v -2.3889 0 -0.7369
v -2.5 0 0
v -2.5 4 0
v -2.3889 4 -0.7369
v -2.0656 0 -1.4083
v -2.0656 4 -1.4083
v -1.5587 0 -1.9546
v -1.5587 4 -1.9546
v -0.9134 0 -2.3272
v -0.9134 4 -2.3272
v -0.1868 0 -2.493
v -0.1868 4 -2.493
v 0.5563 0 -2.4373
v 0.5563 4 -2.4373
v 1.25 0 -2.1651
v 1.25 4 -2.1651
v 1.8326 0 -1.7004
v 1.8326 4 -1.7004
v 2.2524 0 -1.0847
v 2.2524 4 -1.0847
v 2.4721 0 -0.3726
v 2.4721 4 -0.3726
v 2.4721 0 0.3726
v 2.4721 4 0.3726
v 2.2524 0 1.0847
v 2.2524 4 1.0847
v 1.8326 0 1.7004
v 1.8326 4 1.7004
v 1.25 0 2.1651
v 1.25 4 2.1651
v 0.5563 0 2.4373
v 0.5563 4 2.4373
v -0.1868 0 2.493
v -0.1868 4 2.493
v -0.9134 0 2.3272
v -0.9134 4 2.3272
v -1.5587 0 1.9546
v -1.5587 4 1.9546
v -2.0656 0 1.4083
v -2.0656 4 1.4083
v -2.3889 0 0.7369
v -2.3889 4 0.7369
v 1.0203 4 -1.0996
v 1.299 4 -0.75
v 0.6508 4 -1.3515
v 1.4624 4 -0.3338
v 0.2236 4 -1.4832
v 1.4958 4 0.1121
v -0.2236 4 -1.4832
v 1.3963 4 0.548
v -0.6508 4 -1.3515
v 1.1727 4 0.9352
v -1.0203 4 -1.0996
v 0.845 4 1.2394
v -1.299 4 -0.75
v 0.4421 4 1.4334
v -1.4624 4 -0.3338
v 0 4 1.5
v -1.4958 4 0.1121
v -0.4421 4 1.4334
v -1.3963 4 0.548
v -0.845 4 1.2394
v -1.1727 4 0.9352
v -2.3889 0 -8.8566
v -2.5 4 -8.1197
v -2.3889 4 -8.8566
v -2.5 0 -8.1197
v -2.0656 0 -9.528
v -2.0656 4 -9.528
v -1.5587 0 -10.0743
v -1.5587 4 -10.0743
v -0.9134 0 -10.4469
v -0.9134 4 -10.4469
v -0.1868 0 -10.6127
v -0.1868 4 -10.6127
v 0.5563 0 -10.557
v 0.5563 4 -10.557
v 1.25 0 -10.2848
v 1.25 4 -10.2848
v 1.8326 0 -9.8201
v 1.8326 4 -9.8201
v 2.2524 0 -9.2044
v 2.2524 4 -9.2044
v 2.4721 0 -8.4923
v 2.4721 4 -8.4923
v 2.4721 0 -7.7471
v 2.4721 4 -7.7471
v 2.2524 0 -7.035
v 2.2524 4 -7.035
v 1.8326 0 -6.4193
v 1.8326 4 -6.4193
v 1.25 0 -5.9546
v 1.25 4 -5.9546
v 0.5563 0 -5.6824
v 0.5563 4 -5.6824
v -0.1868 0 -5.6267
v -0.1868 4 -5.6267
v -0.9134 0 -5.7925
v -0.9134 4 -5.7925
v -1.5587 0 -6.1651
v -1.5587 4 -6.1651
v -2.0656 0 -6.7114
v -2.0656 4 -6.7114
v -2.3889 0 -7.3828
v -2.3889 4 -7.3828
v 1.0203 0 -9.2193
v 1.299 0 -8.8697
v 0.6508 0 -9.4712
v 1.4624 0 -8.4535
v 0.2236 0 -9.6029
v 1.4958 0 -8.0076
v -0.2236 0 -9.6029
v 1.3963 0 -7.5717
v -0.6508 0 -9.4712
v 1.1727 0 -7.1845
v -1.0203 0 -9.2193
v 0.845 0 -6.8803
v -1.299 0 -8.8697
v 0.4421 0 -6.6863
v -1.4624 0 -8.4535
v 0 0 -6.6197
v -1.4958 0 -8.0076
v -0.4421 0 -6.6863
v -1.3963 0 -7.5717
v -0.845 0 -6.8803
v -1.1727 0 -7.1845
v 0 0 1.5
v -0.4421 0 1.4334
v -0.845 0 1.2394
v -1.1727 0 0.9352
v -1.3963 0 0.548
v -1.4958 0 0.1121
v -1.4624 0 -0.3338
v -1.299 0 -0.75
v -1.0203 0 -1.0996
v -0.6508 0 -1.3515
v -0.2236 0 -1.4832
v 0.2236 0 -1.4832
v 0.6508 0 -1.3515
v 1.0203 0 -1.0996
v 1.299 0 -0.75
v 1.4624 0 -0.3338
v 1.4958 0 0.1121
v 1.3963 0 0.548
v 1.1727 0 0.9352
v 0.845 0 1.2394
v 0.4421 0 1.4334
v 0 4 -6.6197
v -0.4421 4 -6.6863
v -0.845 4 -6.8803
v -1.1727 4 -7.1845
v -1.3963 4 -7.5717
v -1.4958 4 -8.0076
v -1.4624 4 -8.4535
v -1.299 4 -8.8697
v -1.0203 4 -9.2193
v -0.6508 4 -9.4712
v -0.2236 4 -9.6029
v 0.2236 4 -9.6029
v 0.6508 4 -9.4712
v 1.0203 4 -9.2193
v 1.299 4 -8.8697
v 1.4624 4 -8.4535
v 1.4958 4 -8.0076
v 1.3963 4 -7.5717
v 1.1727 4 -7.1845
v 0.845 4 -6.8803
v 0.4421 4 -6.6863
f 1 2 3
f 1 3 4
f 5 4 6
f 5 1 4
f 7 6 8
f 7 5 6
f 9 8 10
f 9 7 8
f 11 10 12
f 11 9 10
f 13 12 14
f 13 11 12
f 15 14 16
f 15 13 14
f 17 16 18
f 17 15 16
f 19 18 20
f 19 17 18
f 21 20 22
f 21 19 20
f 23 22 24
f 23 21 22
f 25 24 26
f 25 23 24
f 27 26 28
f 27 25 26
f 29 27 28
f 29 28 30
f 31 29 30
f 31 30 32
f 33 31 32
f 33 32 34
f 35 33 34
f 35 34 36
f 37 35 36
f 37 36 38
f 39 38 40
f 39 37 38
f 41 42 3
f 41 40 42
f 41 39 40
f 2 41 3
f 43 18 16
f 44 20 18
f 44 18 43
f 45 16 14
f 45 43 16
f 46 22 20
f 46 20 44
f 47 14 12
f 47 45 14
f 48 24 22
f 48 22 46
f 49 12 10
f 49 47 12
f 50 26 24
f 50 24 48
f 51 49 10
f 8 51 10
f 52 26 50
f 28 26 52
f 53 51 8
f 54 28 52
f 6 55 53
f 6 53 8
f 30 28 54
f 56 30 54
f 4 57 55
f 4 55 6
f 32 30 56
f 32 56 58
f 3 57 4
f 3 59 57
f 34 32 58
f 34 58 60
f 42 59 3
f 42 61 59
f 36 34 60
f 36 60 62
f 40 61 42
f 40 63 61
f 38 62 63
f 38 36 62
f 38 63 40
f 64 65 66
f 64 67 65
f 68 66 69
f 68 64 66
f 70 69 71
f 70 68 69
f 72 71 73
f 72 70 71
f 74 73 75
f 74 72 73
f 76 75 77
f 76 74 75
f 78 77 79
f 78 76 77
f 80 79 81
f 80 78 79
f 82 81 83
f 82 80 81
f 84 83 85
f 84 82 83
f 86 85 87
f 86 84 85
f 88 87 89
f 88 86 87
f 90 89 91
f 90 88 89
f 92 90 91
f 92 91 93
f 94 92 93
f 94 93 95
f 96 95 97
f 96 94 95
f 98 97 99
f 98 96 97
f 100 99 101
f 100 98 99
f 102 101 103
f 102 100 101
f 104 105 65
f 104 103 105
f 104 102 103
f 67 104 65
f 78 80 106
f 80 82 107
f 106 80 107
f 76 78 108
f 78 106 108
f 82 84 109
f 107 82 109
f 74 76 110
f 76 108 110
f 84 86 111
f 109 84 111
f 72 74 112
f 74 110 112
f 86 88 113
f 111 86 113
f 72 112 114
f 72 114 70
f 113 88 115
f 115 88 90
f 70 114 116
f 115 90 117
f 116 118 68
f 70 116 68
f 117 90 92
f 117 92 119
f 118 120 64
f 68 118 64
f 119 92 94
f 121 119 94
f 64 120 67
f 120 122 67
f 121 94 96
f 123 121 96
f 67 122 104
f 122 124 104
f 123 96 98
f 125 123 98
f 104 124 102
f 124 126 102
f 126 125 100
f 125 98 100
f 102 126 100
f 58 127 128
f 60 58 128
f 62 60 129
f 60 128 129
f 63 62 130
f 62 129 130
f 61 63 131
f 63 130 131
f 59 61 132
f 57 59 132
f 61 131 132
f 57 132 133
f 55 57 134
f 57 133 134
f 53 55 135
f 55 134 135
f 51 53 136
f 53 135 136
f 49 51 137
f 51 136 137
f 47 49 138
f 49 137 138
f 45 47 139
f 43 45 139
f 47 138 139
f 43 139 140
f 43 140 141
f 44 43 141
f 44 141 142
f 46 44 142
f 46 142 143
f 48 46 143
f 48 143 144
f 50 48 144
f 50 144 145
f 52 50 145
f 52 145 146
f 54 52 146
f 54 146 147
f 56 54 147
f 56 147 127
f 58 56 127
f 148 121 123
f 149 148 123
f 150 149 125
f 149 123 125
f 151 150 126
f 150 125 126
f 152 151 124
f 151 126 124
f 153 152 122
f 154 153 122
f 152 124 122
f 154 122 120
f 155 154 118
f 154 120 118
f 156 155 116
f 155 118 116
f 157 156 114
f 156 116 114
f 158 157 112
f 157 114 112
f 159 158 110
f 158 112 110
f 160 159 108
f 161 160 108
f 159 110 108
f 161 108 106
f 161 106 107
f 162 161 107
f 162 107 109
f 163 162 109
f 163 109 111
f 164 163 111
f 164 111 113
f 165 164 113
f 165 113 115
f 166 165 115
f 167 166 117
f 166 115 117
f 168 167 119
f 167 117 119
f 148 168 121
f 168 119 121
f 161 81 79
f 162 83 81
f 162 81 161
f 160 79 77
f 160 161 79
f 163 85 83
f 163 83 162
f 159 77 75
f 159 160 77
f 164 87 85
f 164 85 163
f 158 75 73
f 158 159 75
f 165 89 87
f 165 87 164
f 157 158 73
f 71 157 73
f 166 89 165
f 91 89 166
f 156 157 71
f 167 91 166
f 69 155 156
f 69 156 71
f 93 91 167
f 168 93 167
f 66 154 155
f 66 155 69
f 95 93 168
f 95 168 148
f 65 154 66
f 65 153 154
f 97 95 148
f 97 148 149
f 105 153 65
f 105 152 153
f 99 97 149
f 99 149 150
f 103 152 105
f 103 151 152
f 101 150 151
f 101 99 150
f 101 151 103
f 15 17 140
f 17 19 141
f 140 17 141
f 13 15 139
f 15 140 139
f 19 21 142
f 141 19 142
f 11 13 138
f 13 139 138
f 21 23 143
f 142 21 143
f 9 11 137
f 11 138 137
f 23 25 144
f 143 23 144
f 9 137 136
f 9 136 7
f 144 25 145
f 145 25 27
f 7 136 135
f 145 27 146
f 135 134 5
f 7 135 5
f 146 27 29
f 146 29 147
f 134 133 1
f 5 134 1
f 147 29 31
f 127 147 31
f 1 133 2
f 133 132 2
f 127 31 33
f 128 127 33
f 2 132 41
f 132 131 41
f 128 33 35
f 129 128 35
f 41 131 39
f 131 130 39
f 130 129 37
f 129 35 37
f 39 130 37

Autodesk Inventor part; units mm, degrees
ref_plane "YZ Plane" through (0, 0, 0) normal (1, 0, 0) x (0, 1, 0)
ref_plane "XZ Plane" through (0, 0, 0) normal (0, 1, 0) x (-1, 0, 0)
ref_plane "XY Plane" through (0, 0, 0) normal (0, 0, 1) x (1, 0, 0)
sketch "Sketch1" plane through (0, 0, 0) normal (0, 1, 0) x (-1, 0, 0)
  circle A0 centre (0, 0) radius 2.5
  circle A1 centre (0, -8.1197) radius 2.5
  dimension "d0" = 5
  dimension "d1" = 5
extrude "Extrusion1" add sketch "Sketch1" along normal blind 4
sketch "Sketch2" plane through (0, 4, 0) normal (0, 1, 0) x (1, 0, 0)
  circle A0 centre (0, 0) radius 2.5 projected
  circle A1 centre (0, 8.1197) radius 2.5 projected
hole "Hole1" at (0, 4, 0) at (0, 4, -8.1197) direction (0, -1, 0) diameter 3 end through all
properties part number "adapters"
